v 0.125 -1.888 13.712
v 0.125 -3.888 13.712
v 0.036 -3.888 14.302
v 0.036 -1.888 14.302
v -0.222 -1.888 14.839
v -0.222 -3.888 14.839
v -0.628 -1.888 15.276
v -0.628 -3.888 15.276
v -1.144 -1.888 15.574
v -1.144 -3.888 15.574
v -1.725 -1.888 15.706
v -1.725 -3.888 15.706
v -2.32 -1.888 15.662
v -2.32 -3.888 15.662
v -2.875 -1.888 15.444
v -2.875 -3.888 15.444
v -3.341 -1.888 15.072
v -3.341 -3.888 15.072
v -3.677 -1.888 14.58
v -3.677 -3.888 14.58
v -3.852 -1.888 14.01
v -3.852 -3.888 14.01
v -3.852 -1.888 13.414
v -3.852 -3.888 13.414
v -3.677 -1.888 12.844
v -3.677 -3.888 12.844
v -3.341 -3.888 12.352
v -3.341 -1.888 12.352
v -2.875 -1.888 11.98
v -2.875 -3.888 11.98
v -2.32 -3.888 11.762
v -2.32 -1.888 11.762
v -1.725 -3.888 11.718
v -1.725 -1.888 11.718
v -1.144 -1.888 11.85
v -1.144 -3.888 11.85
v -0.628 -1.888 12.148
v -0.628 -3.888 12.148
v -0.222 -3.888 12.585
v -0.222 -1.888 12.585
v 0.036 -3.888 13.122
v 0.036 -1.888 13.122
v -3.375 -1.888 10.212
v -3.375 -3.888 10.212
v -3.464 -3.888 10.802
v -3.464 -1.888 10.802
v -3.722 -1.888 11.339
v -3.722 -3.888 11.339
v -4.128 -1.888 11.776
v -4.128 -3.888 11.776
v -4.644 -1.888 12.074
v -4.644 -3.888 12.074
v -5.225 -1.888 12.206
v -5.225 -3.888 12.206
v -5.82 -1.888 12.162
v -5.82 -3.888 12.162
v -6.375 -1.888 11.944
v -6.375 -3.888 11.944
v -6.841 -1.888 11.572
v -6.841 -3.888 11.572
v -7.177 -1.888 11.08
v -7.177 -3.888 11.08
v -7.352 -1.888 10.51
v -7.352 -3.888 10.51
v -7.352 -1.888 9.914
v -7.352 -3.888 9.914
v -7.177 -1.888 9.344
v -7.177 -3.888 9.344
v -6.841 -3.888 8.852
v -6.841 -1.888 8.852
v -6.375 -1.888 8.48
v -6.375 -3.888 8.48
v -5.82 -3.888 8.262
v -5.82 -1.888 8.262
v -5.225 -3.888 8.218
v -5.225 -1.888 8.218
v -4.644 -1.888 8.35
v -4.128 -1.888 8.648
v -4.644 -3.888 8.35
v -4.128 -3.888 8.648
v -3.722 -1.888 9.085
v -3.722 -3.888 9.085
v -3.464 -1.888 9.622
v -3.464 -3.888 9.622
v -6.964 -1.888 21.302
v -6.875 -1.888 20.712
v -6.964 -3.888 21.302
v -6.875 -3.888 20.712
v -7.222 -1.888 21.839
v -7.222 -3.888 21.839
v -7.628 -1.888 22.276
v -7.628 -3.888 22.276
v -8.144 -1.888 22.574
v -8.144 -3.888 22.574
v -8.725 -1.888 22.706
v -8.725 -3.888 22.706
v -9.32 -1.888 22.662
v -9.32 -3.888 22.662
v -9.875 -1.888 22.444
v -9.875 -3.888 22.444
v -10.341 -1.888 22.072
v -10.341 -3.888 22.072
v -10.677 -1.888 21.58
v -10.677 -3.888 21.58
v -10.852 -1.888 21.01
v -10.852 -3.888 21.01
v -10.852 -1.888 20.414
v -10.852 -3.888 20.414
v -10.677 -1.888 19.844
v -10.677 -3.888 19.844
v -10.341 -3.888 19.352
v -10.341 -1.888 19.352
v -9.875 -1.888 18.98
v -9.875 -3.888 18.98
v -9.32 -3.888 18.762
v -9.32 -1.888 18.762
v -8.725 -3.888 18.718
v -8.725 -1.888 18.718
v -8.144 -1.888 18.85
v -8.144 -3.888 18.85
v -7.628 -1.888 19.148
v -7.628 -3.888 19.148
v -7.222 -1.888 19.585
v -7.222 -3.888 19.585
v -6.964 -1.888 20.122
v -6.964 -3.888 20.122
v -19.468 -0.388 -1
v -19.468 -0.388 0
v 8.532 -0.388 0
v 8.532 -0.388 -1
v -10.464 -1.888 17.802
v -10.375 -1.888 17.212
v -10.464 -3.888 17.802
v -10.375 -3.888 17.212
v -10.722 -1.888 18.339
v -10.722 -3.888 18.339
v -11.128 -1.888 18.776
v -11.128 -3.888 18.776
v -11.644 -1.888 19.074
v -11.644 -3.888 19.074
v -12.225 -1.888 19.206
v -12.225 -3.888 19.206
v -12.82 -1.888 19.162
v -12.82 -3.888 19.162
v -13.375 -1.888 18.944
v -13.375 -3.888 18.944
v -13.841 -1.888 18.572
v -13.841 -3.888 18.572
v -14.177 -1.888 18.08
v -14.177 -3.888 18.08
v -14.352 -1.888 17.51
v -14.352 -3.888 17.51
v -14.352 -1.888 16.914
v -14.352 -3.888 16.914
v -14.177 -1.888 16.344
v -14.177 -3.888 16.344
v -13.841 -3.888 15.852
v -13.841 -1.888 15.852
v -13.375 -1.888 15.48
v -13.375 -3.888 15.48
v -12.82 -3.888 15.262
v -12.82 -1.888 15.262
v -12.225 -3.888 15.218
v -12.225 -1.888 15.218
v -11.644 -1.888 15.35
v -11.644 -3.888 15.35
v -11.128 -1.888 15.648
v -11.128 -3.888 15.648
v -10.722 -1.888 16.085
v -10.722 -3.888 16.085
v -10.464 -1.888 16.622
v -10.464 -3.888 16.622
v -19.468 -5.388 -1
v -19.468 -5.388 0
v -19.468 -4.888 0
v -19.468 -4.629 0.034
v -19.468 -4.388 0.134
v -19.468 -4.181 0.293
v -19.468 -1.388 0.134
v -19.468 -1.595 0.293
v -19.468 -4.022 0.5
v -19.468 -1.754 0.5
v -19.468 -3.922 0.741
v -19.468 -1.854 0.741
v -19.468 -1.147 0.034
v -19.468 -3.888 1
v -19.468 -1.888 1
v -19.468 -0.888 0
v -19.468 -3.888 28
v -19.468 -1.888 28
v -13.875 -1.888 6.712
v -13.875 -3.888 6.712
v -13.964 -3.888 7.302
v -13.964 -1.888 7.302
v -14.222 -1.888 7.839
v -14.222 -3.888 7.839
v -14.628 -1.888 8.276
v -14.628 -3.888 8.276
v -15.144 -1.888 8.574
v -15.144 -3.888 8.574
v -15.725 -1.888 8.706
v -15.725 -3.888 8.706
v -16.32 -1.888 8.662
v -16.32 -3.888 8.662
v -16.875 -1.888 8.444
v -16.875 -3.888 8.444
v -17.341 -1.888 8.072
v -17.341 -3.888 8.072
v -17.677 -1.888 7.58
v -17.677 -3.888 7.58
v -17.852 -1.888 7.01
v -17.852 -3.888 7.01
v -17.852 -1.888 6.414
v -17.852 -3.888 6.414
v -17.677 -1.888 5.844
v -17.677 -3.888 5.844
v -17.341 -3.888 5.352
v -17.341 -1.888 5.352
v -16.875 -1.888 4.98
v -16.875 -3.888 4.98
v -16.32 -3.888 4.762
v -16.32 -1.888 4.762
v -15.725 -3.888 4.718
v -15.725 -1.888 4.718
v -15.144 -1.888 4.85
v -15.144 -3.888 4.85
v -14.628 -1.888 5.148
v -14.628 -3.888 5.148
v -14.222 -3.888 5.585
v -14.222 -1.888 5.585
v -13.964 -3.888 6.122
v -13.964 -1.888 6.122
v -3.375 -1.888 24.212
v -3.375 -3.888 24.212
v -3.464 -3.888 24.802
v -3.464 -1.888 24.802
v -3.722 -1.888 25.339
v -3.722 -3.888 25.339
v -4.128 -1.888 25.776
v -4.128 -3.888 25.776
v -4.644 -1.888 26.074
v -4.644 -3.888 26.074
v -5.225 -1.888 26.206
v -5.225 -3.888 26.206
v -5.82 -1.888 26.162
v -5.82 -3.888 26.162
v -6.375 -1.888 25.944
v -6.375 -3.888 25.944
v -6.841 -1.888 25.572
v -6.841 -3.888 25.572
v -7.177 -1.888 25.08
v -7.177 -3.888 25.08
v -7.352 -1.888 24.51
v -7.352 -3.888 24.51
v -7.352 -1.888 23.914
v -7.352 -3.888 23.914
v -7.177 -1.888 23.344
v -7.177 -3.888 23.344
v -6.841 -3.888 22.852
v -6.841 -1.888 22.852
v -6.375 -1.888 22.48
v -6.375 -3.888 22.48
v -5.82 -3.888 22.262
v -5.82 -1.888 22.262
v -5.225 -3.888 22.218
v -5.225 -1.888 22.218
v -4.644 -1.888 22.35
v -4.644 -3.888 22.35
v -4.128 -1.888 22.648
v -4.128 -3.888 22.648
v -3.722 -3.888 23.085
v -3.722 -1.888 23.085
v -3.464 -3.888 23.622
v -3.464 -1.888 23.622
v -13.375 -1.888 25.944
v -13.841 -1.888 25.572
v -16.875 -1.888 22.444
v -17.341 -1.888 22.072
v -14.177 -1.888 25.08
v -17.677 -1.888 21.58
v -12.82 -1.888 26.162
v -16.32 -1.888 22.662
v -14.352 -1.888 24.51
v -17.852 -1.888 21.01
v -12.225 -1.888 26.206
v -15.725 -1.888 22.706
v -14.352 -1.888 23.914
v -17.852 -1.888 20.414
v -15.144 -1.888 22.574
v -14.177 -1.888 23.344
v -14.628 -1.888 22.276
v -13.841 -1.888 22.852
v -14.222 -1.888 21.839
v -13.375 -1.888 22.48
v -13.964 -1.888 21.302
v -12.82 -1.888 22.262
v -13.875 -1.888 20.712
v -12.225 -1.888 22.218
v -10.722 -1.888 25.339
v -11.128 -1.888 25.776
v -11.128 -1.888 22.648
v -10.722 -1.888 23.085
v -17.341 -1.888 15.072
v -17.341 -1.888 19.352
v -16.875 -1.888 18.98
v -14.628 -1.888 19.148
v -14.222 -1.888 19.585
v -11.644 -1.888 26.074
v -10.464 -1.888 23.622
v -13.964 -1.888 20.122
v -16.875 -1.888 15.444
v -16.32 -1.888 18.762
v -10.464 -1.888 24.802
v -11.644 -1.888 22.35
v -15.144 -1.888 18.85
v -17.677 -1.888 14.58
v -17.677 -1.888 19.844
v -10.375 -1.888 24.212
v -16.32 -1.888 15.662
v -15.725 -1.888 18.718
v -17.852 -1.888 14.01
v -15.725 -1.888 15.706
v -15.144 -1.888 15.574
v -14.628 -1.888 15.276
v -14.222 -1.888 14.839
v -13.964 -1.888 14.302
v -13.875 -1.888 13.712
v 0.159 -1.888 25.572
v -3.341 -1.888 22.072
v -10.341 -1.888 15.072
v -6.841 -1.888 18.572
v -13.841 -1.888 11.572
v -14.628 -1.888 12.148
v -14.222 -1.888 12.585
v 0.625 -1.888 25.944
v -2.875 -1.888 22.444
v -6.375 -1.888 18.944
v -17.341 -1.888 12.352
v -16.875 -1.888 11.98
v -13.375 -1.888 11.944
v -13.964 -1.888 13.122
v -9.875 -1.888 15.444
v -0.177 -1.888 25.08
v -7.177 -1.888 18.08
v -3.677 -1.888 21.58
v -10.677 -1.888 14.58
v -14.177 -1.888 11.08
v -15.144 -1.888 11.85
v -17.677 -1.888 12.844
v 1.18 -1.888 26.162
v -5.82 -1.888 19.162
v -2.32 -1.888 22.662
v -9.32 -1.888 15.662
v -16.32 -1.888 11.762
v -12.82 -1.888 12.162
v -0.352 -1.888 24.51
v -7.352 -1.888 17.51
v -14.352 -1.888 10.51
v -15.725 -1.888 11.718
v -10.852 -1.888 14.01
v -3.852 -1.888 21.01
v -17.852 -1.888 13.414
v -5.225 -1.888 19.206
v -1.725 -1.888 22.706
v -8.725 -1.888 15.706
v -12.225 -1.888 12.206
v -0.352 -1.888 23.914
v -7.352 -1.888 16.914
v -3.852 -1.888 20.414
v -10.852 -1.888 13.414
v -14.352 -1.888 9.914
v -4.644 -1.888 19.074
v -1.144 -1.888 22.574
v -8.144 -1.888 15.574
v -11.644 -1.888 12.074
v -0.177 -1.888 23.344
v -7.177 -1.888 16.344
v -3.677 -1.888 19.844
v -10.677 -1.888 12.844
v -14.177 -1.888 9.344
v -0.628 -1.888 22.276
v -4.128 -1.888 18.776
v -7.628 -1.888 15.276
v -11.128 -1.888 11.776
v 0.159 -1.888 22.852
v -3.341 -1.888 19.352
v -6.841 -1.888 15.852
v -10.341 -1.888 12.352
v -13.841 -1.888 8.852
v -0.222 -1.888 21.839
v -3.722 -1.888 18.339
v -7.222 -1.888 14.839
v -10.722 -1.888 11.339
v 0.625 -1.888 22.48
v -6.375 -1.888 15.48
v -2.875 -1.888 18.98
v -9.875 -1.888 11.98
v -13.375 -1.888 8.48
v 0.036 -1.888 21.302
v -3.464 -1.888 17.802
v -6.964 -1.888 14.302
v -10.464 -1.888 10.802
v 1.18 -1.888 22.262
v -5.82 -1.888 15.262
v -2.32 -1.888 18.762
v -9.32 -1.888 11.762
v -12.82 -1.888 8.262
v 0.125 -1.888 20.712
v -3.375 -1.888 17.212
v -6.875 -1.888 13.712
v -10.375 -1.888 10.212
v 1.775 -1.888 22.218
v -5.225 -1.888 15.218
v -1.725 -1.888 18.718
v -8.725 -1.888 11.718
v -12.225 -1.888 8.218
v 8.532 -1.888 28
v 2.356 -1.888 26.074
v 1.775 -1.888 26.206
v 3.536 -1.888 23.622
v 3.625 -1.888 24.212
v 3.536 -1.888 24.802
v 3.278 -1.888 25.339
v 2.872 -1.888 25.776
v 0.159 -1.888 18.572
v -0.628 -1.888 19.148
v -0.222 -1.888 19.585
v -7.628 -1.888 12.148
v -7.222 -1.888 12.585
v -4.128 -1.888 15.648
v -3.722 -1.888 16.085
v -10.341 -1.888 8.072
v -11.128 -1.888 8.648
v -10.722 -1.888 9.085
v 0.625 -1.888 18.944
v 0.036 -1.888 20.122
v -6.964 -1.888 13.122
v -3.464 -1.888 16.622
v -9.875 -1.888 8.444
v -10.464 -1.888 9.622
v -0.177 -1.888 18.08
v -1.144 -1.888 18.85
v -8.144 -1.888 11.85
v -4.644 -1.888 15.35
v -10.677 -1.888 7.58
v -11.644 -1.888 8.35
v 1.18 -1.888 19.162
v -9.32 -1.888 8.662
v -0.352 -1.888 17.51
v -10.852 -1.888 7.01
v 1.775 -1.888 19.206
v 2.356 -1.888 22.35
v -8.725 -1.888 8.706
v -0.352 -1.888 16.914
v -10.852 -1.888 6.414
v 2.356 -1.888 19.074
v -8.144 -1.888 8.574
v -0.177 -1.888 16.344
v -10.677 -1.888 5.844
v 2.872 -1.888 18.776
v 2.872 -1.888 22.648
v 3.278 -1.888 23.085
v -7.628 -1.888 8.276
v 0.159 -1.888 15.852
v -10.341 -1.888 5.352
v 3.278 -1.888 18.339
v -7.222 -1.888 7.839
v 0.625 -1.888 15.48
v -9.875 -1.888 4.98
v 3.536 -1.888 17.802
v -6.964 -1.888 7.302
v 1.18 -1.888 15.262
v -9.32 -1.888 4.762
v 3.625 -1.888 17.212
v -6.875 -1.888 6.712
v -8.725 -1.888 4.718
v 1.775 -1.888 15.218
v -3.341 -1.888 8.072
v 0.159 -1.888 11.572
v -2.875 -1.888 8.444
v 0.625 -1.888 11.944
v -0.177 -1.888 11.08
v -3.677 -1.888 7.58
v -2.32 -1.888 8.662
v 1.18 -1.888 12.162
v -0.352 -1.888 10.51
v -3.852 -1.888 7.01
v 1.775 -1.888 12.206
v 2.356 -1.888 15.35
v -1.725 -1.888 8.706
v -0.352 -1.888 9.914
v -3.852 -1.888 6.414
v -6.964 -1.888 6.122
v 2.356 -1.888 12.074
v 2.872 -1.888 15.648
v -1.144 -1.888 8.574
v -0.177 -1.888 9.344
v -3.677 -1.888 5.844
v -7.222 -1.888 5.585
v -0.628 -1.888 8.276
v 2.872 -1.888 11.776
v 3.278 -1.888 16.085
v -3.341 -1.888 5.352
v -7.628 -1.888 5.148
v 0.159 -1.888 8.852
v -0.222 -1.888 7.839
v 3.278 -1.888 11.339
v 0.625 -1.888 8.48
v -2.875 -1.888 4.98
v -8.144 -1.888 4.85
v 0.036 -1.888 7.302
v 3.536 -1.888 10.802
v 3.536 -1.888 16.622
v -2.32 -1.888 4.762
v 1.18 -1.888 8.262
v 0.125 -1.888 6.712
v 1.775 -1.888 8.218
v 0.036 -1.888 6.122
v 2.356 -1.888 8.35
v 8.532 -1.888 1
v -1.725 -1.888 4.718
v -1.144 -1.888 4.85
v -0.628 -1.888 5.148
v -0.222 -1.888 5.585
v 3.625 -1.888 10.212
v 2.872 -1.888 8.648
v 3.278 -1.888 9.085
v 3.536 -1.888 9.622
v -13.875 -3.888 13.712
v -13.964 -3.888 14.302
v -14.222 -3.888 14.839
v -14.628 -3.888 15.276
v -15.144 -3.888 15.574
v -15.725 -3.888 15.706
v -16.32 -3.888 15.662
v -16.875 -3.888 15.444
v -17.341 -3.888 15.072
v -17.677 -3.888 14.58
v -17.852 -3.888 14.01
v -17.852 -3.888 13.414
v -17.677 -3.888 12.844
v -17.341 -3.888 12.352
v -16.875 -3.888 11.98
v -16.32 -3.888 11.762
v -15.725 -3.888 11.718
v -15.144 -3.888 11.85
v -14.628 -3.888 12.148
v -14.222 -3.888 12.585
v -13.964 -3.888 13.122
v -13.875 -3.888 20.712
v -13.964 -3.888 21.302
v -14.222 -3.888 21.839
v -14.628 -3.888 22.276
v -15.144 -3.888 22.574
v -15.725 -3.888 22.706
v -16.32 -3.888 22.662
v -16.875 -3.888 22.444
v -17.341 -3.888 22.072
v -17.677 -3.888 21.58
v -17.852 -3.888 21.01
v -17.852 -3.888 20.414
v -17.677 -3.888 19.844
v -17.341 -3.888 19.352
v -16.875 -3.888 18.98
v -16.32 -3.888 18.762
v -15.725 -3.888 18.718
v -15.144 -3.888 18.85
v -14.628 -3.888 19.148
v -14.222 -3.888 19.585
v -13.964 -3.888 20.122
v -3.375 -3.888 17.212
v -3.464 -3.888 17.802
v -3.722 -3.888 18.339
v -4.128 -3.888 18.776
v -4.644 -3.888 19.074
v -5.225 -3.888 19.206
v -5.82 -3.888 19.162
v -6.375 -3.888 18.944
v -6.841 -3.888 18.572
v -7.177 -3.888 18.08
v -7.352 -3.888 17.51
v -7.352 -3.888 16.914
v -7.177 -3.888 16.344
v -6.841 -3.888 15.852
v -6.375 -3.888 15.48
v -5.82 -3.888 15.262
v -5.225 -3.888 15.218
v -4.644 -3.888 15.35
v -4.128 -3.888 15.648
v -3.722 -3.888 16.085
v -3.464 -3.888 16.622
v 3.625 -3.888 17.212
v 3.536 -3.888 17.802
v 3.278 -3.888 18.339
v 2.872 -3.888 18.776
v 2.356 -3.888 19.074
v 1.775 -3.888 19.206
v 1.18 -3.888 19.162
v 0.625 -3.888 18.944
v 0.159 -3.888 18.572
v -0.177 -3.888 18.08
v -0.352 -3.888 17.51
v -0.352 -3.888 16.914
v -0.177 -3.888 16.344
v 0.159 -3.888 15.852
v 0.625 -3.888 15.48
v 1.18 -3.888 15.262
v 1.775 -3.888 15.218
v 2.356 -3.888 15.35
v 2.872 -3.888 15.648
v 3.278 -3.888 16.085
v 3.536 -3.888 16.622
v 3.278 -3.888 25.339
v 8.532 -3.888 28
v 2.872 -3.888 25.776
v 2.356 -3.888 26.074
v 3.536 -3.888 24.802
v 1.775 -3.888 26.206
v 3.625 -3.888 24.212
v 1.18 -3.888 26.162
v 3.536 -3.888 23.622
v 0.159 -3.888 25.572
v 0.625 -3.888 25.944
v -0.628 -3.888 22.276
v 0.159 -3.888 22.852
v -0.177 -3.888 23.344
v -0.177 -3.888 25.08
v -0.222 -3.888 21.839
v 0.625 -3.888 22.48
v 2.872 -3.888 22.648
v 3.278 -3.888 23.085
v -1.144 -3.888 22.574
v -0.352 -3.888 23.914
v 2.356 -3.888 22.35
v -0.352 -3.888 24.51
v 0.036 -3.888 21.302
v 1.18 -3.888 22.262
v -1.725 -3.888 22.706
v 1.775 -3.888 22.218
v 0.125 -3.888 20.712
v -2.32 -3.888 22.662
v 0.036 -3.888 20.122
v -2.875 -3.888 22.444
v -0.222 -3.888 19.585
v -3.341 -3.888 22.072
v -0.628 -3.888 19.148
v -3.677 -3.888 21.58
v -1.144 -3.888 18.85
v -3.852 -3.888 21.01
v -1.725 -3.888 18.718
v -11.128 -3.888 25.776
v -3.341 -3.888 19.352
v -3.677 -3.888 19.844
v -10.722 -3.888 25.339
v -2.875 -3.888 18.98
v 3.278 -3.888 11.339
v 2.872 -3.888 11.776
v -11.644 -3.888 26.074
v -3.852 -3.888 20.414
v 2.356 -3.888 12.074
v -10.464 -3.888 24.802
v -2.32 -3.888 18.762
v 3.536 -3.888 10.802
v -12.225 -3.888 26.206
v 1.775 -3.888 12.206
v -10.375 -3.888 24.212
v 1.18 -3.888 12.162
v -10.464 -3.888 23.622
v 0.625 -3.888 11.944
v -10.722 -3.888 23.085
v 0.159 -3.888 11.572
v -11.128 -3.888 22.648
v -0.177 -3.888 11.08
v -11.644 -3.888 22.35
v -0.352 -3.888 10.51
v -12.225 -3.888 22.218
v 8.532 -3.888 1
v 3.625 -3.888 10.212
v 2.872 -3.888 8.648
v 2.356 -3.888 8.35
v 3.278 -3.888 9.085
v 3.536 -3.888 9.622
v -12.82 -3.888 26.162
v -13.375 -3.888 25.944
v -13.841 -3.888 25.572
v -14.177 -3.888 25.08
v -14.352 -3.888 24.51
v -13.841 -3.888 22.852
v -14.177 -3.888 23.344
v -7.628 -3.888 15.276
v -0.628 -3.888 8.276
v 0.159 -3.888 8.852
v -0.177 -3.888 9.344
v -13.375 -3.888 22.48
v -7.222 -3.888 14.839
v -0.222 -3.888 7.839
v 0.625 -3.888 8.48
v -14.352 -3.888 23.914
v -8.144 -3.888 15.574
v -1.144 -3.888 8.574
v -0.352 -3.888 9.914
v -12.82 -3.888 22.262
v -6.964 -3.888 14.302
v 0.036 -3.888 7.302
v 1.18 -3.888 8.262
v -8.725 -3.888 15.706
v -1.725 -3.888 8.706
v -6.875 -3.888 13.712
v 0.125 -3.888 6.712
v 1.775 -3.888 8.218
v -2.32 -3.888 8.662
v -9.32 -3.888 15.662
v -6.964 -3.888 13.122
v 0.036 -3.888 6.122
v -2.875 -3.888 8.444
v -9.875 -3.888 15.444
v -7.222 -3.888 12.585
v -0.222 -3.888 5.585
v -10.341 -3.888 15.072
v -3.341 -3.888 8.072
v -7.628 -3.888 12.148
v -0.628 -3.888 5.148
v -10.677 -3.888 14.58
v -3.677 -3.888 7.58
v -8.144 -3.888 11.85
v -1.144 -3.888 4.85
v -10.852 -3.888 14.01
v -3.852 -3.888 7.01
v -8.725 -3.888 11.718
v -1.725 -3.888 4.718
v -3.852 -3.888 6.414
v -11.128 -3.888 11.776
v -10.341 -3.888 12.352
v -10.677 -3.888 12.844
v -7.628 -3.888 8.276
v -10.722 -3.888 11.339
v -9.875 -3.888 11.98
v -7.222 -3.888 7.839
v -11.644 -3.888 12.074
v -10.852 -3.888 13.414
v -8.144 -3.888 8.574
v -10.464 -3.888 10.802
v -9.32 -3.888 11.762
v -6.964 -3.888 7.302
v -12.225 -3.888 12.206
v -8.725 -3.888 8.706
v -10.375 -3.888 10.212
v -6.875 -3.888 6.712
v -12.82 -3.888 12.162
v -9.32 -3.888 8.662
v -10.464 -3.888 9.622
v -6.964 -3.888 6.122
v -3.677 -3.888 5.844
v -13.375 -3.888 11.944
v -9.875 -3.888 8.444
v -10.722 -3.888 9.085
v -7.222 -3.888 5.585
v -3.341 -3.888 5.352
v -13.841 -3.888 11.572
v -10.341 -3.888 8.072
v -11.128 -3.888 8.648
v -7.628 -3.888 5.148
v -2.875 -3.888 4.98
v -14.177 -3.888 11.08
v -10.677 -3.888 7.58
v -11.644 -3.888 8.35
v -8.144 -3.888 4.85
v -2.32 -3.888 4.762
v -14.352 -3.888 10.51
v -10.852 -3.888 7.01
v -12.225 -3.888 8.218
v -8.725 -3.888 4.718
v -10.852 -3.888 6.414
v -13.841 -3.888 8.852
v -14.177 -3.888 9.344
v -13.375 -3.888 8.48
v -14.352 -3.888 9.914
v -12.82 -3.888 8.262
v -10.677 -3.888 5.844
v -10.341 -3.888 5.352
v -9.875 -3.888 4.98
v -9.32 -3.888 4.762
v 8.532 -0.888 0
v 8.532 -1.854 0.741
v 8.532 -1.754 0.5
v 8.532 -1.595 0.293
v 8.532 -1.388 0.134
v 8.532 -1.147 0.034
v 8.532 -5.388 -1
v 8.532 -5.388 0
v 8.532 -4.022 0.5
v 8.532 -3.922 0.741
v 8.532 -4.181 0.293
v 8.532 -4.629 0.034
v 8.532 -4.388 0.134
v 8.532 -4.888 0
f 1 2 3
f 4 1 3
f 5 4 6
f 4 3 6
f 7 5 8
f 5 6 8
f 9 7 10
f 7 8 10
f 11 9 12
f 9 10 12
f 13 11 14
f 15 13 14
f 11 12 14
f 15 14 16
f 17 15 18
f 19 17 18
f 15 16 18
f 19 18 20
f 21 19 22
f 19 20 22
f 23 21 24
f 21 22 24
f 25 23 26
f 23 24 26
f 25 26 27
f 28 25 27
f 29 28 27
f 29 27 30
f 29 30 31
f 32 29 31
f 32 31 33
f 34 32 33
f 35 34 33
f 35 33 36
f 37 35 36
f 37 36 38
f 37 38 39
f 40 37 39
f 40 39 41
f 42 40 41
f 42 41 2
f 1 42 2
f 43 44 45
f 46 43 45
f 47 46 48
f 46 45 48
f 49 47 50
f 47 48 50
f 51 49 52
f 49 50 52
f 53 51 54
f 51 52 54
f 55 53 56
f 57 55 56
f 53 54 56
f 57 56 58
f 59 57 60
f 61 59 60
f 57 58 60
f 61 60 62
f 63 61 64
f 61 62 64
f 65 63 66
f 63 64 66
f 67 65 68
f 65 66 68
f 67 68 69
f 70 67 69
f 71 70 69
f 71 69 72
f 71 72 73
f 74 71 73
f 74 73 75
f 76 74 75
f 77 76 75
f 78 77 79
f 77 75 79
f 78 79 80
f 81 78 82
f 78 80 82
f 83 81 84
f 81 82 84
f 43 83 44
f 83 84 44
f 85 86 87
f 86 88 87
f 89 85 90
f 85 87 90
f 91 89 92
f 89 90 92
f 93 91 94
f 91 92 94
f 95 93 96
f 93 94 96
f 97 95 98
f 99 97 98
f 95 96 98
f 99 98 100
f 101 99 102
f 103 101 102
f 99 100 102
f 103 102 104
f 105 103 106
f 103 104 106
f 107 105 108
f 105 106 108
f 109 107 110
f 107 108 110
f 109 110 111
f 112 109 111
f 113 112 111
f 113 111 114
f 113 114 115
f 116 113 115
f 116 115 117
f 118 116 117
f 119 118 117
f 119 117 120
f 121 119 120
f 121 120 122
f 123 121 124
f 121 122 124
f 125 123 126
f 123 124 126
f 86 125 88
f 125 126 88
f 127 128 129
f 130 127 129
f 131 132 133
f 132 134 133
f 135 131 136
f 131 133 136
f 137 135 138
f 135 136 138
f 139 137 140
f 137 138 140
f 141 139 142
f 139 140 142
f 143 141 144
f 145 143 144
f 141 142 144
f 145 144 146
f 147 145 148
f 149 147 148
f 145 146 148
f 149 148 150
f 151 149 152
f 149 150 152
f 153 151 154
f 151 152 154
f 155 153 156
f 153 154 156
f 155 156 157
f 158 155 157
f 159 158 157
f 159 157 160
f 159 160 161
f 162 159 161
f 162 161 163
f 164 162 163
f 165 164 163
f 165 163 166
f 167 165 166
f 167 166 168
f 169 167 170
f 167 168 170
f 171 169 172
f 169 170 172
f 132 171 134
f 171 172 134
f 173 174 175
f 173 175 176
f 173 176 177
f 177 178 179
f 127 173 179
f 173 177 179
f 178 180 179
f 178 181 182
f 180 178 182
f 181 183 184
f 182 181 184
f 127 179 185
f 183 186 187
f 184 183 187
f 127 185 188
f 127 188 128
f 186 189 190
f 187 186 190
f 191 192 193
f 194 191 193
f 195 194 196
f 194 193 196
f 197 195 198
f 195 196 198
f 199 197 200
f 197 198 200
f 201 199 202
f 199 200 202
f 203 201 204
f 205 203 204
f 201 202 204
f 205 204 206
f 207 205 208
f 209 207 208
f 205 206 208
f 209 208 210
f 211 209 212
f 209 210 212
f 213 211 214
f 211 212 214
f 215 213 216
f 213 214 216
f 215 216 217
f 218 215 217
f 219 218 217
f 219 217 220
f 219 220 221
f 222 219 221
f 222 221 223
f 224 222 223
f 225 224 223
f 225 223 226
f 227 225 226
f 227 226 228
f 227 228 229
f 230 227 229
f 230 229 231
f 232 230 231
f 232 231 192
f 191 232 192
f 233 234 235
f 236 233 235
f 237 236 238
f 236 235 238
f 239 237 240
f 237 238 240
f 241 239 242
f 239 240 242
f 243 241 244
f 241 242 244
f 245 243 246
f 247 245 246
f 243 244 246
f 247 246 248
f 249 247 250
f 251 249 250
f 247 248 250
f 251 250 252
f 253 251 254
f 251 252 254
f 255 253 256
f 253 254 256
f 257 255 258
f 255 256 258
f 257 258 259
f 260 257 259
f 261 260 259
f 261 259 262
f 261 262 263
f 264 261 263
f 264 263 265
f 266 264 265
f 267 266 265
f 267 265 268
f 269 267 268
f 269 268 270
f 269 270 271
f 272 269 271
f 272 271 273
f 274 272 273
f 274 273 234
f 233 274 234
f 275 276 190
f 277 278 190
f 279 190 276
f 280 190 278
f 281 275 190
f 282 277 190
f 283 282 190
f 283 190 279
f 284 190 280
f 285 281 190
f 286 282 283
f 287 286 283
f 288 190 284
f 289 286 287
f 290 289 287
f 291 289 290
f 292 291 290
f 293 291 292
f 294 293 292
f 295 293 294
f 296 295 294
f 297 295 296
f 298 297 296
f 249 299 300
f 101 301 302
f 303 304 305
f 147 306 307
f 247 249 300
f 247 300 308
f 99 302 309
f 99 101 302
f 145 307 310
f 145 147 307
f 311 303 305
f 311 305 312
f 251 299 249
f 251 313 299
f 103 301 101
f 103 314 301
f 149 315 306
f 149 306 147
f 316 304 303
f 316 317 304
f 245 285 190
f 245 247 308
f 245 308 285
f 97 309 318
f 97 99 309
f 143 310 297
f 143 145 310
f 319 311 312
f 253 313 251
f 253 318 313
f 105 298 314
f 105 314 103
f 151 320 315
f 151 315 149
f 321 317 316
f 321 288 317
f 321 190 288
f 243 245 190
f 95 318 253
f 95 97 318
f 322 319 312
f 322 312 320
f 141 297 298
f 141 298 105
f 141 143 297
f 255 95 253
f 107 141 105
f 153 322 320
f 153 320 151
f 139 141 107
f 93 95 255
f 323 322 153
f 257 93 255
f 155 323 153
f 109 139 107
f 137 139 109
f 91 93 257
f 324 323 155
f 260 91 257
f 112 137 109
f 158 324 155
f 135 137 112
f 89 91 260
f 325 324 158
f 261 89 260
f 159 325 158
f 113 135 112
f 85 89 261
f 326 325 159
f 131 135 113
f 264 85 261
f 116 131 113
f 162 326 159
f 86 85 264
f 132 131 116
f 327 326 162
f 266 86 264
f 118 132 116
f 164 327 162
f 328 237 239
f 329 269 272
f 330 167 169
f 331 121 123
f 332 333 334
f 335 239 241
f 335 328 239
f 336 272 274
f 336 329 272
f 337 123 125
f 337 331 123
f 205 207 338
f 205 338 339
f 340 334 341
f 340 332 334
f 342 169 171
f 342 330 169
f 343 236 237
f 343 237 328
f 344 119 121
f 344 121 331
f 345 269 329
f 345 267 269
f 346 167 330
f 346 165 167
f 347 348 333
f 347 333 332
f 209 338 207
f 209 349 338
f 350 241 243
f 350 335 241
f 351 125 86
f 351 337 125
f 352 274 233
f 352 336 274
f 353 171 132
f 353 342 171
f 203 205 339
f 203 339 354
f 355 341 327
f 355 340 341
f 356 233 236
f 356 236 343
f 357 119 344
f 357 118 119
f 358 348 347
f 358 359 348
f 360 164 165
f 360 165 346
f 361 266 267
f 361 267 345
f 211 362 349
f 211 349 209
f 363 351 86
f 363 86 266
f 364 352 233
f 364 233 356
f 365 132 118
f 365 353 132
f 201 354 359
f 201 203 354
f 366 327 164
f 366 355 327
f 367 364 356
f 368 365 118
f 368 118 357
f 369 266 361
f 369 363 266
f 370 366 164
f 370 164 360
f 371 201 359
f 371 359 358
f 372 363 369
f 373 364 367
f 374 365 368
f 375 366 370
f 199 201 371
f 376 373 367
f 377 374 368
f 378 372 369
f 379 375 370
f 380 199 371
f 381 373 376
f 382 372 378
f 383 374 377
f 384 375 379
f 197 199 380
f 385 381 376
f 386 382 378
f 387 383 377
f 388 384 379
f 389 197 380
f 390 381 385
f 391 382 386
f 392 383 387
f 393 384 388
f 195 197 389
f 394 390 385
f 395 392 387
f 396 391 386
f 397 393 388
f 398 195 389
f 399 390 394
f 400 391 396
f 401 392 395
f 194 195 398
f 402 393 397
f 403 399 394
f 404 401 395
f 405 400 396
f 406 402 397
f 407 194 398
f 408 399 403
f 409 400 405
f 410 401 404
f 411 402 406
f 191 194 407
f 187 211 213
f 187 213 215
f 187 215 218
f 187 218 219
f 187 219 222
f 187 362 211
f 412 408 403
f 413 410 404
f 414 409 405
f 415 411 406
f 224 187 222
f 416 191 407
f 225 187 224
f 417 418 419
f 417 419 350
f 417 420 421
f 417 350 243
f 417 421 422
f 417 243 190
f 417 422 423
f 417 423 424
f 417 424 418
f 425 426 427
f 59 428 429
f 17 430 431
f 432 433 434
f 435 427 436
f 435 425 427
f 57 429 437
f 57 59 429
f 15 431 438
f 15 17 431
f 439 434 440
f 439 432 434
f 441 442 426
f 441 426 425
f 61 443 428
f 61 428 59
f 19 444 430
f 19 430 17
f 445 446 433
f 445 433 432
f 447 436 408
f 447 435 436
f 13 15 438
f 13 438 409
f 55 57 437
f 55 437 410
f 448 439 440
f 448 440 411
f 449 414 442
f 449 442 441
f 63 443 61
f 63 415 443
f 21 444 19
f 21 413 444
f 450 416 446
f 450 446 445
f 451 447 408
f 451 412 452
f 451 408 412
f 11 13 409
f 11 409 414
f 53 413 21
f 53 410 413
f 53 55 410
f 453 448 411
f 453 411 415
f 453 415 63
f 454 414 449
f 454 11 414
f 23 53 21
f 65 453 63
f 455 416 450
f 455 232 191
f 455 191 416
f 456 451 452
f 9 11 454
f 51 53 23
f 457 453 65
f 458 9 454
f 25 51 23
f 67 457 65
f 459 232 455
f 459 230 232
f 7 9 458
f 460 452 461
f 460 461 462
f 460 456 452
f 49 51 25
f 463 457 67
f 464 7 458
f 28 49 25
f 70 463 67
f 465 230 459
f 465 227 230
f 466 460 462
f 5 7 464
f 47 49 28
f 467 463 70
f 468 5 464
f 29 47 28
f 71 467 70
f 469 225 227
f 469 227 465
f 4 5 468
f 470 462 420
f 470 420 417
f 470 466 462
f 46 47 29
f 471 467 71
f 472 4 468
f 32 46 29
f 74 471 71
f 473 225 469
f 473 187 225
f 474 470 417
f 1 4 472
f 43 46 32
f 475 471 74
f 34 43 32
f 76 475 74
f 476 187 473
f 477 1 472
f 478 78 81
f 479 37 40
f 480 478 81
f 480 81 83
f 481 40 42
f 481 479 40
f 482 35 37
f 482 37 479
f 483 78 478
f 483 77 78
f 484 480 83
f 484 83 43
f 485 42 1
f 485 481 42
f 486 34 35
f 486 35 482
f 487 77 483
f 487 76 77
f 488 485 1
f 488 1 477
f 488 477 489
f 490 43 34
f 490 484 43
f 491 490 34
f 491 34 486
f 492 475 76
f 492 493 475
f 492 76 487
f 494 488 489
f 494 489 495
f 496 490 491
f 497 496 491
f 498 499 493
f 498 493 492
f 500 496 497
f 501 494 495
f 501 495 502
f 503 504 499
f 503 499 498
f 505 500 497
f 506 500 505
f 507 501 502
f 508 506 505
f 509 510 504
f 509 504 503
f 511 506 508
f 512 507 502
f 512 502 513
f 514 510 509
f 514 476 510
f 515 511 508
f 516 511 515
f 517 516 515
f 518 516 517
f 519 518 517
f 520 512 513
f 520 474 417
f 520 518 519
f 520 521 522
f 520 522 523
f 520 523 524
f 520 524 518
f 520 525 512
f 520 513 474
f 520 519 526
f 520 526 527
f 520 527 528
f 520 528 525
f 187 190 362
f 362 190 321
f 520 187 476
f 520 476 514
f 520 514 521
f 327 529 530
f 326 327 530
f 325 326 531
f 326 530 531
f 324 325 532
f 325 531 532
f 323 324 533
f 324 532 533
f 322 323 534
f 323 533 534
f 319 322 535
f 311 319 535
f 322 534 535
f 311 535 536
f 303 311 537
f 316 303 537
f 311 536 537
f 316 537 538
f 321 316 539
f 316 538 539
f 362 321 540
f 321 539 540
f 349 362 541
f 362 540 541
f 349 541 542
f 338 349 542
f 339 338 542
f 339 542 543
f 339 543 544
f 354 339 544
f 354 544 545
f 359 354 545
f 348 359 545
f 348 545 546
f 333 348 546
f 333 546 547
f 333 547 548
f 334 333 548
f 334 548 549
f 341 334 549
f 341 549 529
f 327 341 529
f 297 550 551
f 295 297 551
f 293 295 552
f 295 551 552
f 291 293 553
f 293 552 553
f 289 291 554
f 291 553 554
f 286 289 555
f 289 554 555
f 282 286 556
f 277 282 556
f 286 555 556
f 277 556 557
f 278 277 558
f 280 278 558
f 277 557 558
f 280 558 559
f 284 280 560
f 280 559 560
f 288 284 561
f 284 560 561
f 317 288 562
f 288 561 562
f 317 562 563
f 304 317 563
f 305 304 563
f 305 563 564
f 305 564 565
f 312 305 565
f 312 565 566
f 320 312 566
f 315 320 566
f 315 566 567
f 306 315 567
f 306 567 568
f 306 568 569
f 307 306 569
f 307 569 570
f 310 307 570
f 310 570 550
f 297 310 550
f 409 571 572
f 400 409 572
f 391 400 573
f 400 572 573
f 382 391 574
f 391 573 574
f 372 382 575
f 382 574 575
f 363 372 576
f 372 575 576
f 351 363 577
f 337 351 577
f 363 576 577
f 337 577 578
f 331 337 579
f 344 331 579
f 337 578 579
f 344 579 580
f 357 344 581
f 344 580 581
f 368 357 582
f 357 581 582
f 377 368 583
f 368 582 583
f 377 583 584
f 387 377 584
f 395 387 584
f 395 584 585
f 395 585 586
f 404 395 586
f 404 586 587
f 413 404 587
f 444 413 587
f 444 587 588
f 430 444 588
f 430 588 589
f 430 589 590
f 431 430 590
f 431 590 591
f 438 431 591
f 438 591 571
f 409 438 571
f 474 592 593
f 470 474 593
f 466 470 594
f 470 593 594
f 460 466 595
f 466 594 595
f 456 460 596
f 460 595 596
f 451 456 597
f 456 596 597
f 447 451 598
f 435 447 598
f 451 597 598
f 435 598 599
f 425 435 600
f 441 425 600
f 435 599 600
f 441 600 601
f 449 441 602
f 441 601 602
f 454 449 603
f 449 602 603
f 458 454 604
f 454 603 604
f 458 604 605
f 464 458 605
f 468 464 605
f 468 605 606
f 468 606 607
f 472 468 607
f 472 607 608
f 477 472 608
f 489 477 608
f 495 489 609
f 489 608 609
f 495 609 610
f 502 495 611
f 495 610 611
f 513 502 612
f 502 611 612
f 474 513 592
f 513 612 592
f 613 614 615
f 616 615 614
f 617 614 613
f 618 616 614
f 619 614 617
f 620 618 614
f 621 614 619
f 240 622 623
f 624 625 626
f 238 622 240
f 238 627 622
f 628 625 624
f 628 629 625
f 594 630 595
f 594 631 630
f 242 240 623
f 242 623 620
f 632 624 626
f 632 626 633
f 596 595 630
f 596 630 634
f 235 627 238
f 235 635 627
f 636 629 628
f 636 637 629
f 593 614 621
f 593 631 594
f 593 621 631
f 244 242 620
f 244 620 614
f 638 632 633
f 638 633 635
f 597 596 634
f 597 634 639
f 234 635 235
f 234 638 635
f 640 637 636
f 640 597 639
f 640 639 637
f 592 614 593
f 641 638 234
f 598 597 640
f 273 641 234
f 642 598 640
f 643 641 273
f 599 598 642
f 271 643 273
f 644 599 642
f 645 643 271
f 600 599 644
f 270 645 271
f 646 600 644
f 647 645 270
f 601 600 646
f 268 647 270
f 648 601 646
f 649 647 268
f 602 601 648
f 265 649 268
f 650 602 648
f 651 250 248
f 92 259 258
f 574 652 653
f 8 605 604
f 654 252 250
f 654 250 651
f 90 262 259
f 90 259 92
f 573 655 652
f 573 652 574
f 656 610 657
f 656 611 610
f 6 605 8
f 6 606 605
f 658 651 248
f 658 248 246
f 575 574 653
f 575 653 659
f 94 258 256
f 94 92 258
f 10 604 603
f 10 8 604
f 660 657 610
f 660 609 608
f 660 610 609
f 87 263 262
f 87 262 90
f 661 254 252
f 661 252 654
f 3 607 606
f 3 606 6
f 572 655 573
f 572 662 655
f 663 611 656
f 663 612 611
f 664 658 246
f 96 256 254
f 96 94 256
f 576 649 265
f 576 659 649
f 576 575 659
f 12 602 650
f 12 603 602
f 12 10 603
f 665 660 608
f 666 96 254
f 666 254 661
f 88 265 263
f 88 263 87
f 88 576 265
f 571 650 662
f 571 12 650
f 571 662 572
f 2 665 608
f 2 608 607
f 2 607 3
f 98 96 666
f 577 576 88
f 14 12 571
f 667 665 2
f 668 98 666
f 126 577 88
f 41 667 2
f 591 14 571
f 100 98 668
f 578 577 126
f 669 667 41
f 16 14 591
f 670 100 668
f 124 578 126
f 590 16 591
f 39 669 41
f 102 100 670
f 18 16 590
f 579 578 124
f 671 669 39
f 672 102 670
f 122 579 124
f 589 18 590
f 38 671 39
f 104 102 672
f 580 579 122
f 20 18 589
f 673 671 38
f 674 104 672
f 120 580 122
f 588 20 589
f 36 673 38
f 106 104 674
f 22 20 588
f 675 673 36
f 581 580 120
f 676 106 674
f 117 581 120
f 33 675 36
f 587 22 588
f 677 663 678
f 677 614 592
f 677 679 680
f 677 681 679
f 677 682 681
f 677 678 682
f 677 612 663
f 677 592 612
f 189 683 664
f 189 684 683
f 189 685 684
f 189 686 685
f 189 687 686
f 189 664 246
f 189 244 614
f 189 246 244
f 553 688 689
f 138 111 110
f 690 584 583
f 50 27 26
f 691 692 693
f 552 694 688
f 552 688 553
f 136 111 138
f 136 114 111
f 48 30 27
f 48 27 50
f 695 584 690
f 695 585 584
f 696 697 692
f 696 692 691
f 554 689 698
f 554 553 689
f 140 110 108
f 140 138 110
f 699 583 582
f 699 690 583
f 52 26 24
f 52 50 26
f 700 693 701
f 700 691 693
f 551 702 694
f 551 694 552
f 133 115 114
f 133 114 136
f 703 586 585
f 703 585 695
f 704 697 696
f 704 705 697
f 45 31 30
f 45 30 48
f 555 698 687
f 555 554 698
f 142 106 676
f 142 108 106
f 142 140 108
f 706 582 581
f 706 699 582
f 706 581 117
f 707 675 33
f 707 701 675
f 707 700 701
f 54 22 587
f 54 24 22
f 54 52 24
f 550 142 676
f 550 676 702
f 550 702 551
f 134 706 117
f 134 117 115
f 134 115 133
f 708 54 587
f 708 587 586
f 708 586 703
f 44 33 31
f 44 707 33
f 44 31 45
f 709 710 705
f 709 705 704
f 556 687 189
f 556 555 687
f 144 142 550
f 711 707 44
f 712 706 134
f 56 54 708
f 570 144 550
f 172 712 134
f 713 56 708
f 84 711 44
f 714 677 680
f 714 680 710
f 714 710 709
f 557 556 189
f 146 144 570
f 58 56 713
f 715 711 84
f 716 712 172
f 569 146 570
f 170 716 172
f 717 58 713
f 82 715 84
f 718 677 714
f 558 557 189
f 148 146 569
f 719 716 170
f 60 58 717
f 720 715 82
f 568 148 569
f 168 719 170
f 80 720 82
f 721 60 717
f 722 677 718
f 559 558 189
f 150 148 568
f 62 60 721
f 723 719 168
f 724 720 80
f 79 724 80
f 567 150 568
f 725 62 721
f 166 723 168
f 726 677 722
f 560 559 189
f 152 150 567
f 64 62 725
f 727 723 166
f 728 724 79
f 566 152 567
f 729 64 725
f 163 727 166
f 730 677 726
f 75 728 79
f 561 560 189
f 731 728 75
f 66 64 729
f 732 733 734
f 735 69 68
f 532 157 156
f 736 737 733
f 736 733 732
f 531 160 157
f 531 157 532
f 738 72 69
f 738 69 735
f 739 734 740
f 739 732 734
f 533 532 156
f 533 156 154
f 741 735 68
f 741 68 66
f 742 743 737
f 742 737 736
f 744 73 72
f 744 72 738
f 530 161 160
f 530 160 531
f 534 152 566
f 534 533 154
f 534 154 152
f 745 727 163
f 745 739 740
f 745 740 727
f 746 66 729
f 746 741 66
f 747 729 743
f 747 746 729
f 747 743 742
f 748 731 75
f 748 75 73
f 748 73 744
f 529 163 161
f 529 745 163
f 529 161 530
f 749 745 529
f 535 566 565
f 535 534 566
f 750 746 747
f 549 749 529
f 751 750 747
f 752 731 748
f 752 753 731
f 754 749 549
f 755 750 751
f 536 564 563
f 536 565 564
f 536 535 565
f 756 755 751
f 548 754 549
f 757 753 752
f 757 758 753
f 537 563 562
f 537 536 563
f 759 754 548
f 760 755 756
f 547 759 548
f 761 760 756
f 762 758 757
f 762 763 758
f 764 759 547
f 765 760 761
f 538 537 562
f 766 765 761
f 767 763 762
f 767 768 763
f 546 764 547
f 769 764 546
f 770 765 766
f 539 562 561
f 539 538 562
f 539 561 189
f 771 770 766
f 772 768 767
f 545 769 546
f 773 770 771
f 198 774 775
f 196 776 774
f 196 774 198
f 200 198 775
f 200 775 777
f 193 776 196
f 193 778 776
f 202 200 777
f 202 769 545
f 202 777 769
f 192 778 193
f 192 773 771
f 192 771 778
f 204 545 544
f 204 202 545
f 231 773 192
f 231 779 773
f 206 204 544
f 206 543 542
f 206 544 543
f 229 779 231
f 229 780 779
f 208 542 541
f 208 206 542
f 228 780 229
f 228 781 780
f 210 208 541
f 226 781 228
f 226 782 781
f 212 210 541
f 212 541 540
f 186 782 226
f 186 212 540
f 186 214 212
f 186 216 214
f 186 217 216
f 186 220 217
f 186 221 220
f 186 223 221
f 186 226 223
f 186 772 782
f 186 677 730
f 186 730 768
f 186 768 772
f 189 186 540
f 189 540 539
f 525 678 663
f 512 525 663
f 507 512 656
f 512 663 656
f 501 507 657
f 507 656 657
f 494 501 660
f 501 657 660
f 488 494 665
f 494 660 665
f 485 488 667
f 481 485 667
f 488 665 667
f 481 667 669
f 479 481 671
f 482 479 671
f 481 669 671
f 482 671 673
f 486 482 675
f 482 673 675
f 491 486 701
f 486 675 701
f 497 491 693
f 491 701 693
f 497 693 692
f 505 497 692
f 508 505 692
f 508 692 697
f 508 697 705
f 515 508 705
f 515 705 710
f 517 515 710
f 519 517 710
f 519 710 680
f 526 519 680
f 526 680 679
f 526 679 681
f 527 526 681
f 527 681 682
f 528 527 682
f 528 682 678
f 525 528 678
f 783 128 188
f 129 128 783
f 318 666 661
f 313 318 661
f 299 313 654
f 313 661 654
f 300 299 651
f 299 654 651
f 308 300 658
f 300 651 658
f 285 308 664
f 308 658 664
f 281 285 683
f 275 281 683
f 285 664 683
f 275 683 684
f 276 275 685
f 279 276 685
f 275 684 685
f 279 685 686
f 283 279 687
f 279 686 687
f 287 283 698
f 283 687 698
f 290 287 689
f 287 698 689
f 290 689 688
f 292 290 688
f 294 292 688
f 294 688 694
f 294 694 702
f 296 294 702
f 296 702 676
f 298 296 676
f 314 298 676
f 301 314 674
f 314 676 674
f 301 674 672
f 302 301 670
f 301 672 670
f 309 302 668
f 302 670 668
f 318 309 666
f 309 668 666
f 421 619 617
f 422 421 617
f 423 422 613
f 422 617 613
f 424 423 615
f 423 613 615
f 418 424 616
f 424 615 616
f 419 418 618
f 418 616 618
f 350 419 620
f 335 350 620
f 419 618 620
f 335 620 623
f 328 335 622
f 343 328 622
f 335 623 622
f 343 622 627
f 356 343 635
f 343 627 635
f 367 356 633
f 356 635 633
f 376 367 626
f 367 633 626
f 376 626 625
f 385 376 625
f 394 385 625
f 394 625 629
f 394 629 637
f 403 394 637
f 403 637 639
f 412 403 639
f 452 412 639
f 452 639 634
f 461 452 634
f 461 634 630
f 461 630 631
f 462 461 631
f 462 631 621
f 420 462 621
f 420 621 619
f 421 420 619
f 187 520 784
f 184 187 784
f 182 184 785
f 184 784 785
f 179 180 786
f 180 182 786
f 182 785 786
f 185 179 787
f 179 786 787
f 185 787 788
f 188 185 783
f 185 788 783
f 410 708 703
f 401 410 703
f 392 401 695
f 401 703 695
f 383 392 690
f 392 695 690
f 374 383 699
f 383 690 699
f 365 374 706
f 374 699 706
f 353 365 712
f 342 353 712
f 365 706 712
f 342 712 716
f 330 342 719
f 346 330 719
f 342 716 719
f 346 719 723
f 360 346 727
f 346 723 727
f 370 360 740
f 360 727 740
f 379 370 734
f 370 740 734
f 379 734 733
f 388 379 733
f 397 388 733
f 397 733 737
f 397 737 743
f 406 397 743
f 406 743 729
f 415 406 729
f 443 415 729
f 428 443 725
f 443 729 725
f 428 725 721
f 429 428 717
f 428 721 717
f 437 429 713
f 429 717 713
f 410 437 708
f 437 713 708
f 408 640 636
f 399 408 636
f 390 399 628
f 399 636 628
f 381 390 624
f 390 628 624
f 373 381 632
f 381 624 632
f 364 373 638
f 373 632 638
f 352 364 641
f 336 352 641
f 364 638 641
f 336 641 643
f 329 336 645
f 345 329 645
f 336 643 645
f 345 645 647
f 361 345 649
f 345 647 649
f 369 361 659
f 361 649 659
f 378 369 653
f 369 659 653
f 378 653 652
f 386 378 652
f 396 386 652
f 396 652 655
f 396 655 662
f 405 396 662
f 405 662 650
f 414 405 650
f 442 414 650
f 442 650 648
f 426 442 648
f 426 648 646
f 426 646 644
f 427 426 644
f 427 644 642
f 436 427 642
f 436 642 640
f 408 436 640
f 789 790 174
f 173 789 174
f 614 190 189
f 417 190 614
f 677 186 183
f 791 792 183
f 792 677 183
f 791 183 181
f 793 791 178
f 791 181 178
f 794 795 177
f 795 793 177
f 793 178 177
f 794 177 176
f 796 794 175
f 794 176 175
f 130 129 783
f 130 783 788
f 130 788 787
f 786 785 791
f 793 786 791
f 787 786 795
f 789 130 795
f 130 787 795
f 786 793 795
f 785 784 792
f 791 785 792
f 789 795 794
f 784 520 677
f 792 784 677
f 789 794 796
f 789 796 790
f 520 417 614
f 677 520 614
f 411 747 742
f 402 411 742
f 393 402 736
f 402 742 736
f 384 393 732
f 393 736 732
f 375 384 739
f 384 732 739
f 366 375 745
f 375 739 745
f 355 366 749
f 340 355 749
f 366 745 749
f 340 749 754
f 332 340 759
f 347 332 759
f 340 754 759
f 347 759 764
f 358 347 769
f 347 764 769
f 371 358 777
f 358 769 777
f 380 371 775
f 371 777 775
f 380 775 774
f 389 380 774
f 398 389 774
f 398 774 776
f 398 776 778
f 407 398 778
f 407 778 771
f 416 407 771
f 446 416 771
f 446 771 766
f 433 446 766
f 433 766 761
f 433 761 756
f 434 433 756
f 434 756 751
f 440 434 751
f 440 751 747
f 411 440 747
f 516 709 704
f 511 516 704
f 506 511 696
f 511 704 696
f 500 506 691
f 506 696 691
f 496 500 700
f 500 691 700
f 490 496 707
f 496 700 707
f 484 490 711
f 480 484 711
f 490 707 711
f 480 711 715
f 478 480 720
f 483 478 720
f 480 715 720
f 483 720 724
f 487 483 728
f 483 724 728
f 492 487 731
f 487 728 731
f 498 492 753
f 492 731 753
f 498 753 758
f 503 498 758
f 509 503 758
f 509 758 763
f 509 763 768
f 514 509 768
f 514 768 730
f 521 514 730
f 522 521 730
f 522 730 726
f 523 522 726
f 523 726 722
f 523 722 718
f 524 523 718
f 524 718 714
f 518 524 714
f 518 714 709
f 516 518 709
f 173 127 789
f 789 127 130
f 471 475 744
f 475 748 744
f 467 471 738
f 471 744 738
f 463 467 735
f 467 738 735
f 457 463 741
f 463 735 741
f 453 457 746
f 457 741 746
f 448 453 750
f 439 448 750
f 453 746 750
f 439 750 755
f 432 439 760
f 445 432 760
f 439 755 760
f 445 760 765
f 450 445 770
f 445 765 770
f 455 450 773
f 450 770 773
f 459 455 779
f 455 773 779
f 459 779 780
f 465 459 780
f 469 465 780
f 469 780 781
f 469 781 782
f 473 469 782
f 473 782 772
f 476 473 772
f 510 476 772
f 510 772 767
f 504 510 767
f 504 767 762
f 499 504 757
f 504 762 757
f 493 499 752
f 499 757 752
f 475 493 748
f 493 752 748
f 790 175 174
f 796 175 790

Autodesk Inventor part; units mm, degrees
ref_plane "YZ Plane" through (0, 0, 0) normal (1, 0, 0) x (0, 1, 0)
ref_plane "XZ Plane" through (0, 0, 0) normal (0, 1, 0) x (-1, 0, 0)
ref_plane "XY Plane" through (0, 0, 0) normal (0, 0, 1) x (1, 0, 0)
sketch "Sketch1" plane through (0, 0, 0) normal (0, 0, 1) x (1, 0, 0)
  line L0 (-19.4684, -0.3877) -> (8.5316, -0.3877)
  line L1 (8.5316, -0.3877) -> (8.5316, -5.3877)
  line L2 (8.5316, -5.3877) -> (-19.4684, -5.3877)
  line L3 (-19.4684, -5.3877) -> (-19.4684, -0.3877)
  line L4 (-19.4684, -1.8877) -> (8.5316, -1.8877)
  line L5 (8.5316, -1.8877) -> (8.5316, -3.8877)
  line L6 (8.5316, -3.8877) -> (-19.4684, -3.8877)
  line L7 (-19.4684, -3.8877) -> (-19.4684, -1.8877)
  point P0 (0, 0)
  dimension "d0" = 28
  dimension "d1" = 5
  dimension "d4" = 2
  dimension "d5" = 28
  dimension "d7" = 1.5
  dimension "d56" = 0
extrude "Extrusion1" add sketch "Sketch1" along normal blind 28 contours L4 L1 L6 L3
extrude "Extrusion2" add sketch "Sketch1" against normal blind 1
fillet "Fillet1" radius 1 2 edges at (-5.4684, -3.8877, 0) (-5.4684, -1.8877, 0)
sketch "Sketch2" plane through (-19.4684, -3.8877, 28) normal (0, -1, 0) x (1, 0, 0)
  line L0 (27, -1) -> (1, -1)
  line L1 (1, -1) -> (1, -17)
  line L2 (1, -17) -> (27, -17)
  line L3 (27, -17) -> (27, -1)
  line L4 (0, 0) -> (28, 0) projected
  line L5 (2.3536, -1) -> (7.3536, -1) construction
  line L6 (8.0711, -1) -> (5.2426, -3.8284)
  line L7 (5.2426, -3.8284) -> (2.4142, -1)
  line L8 (1, -2.4142) -> (3.8284, -5.2426)
  line L9 (3.8284, -5.2426) -> (1, -8.0711)
  line L10 (1, -8.0711) -> (2.4142, -9.4853)
  line L11 (2.4142, -9.4853) -> (5.2426, -6.6569)
  line L12 (5.2426, -6.6569) -> (8.0711, -9.4853)
  line L13 (8.0711, -9.4853) -> (9.4853, -8.0711)
  line L14 (9.4853, -8.0711) -> (6.6569, -5.2426)
  line L15 (6.6569, -5.2426) -> (9.4853, -2.4142)
  line L16 (9.4853, -2.4142) -> (8.0711, -1)
  line L17 (2.4142, -1) -> (1, -2.4142)
  line L18 (9.4853, -2.4142) -> (9.4853, -8.0711)
  line L19 (8.0711, -9.4853) -> (2.4142, -9.4853)
  line L20 (1, -8.0711) -> (1, -2.4142)
  line L21 (2.4142, -1) -> (8.0711, -1)
  line L22 (28, -27) -> (28, 0) projected
  line L23 (0, -27) -> (0, 0) projected
  point P0 (19.4684, -28)
  dimension "d28" = 4
  dimension "d29" = 2
  dimension "d30" = 4
  dimension "d31" = 2
  dimension "d32" = 4
  dimension "d39" = 8.4853
  dimension "d40" = 1
  dimension "d41" = 1
  dimension "d42" = 1
extrude "Extrusion3" [suppressed]
pattern_linear "Rectangular Pattern1" [suppressed]
sketch "Sketch3" plane through (-19.4684, -3.8877, 28) normal (0, -1, 0) x (1, 0, 0)
  line L0 (3, -3) -> (3, -21) construction
  line L1 (2, -3) -> (2, -21)
  line L2 (4, -21) -> (4, -3)
  arc A0 (4, -3) -> (2, -3) centre (3, -3) ccw
  arc A1 (2, -21) -> (4, -21) centre (3, -21) ccw
  line L3 (0, 0) -> (28, 0) projected
  line L4 (0, -27) -> (0, 0) projected
  point P0 (19.4684, -28)
  point P1 (3, -12)
  dimension "d43" = 2
  dimension "d44" = 3
  dimension "d45" = 18
  dimension "d48" = 3
extrude "Extrusion4" [suppressed]
pattern_linear "Rectangular Pattern2" [suppressed]
fillet "Fillet2" [suppressed]
sketch "Sketch4" plane through (-19.4684, -3.8877, 28) normal (0, -1, 0) x (1, 0, 0)
  line L0 (0, -27) -> (0, 0) projected
  circle A0 centre (3.5936, -7.288) radius 2
  circle A1 centre (7.0936, -3.788) radius 2
  point P0 (19.4684, -28)
  dimension "d80" = 4
  dimension "d81" = 4
  dimension "d82" = 3.5
  dimension "d83" = 3.5
extrude "Extrusion5" cut sketch "Sketch4" against normal blind 10
pattern_linear "Rectangular Pattern3" count 3 spacing 7 along (1, 0, 0) count 3 spacing 7 along (0, 0, -1) of "Extrusion5"
equation "\"d0\" = d5"
equation "\"d28\" = d32"
equation "\"d29\" = d31"
equation "\"d30\" = d32"
equation "\"d80\" = d81"
equation "\"d83\" = d82"
properties part number "vent test circle"
